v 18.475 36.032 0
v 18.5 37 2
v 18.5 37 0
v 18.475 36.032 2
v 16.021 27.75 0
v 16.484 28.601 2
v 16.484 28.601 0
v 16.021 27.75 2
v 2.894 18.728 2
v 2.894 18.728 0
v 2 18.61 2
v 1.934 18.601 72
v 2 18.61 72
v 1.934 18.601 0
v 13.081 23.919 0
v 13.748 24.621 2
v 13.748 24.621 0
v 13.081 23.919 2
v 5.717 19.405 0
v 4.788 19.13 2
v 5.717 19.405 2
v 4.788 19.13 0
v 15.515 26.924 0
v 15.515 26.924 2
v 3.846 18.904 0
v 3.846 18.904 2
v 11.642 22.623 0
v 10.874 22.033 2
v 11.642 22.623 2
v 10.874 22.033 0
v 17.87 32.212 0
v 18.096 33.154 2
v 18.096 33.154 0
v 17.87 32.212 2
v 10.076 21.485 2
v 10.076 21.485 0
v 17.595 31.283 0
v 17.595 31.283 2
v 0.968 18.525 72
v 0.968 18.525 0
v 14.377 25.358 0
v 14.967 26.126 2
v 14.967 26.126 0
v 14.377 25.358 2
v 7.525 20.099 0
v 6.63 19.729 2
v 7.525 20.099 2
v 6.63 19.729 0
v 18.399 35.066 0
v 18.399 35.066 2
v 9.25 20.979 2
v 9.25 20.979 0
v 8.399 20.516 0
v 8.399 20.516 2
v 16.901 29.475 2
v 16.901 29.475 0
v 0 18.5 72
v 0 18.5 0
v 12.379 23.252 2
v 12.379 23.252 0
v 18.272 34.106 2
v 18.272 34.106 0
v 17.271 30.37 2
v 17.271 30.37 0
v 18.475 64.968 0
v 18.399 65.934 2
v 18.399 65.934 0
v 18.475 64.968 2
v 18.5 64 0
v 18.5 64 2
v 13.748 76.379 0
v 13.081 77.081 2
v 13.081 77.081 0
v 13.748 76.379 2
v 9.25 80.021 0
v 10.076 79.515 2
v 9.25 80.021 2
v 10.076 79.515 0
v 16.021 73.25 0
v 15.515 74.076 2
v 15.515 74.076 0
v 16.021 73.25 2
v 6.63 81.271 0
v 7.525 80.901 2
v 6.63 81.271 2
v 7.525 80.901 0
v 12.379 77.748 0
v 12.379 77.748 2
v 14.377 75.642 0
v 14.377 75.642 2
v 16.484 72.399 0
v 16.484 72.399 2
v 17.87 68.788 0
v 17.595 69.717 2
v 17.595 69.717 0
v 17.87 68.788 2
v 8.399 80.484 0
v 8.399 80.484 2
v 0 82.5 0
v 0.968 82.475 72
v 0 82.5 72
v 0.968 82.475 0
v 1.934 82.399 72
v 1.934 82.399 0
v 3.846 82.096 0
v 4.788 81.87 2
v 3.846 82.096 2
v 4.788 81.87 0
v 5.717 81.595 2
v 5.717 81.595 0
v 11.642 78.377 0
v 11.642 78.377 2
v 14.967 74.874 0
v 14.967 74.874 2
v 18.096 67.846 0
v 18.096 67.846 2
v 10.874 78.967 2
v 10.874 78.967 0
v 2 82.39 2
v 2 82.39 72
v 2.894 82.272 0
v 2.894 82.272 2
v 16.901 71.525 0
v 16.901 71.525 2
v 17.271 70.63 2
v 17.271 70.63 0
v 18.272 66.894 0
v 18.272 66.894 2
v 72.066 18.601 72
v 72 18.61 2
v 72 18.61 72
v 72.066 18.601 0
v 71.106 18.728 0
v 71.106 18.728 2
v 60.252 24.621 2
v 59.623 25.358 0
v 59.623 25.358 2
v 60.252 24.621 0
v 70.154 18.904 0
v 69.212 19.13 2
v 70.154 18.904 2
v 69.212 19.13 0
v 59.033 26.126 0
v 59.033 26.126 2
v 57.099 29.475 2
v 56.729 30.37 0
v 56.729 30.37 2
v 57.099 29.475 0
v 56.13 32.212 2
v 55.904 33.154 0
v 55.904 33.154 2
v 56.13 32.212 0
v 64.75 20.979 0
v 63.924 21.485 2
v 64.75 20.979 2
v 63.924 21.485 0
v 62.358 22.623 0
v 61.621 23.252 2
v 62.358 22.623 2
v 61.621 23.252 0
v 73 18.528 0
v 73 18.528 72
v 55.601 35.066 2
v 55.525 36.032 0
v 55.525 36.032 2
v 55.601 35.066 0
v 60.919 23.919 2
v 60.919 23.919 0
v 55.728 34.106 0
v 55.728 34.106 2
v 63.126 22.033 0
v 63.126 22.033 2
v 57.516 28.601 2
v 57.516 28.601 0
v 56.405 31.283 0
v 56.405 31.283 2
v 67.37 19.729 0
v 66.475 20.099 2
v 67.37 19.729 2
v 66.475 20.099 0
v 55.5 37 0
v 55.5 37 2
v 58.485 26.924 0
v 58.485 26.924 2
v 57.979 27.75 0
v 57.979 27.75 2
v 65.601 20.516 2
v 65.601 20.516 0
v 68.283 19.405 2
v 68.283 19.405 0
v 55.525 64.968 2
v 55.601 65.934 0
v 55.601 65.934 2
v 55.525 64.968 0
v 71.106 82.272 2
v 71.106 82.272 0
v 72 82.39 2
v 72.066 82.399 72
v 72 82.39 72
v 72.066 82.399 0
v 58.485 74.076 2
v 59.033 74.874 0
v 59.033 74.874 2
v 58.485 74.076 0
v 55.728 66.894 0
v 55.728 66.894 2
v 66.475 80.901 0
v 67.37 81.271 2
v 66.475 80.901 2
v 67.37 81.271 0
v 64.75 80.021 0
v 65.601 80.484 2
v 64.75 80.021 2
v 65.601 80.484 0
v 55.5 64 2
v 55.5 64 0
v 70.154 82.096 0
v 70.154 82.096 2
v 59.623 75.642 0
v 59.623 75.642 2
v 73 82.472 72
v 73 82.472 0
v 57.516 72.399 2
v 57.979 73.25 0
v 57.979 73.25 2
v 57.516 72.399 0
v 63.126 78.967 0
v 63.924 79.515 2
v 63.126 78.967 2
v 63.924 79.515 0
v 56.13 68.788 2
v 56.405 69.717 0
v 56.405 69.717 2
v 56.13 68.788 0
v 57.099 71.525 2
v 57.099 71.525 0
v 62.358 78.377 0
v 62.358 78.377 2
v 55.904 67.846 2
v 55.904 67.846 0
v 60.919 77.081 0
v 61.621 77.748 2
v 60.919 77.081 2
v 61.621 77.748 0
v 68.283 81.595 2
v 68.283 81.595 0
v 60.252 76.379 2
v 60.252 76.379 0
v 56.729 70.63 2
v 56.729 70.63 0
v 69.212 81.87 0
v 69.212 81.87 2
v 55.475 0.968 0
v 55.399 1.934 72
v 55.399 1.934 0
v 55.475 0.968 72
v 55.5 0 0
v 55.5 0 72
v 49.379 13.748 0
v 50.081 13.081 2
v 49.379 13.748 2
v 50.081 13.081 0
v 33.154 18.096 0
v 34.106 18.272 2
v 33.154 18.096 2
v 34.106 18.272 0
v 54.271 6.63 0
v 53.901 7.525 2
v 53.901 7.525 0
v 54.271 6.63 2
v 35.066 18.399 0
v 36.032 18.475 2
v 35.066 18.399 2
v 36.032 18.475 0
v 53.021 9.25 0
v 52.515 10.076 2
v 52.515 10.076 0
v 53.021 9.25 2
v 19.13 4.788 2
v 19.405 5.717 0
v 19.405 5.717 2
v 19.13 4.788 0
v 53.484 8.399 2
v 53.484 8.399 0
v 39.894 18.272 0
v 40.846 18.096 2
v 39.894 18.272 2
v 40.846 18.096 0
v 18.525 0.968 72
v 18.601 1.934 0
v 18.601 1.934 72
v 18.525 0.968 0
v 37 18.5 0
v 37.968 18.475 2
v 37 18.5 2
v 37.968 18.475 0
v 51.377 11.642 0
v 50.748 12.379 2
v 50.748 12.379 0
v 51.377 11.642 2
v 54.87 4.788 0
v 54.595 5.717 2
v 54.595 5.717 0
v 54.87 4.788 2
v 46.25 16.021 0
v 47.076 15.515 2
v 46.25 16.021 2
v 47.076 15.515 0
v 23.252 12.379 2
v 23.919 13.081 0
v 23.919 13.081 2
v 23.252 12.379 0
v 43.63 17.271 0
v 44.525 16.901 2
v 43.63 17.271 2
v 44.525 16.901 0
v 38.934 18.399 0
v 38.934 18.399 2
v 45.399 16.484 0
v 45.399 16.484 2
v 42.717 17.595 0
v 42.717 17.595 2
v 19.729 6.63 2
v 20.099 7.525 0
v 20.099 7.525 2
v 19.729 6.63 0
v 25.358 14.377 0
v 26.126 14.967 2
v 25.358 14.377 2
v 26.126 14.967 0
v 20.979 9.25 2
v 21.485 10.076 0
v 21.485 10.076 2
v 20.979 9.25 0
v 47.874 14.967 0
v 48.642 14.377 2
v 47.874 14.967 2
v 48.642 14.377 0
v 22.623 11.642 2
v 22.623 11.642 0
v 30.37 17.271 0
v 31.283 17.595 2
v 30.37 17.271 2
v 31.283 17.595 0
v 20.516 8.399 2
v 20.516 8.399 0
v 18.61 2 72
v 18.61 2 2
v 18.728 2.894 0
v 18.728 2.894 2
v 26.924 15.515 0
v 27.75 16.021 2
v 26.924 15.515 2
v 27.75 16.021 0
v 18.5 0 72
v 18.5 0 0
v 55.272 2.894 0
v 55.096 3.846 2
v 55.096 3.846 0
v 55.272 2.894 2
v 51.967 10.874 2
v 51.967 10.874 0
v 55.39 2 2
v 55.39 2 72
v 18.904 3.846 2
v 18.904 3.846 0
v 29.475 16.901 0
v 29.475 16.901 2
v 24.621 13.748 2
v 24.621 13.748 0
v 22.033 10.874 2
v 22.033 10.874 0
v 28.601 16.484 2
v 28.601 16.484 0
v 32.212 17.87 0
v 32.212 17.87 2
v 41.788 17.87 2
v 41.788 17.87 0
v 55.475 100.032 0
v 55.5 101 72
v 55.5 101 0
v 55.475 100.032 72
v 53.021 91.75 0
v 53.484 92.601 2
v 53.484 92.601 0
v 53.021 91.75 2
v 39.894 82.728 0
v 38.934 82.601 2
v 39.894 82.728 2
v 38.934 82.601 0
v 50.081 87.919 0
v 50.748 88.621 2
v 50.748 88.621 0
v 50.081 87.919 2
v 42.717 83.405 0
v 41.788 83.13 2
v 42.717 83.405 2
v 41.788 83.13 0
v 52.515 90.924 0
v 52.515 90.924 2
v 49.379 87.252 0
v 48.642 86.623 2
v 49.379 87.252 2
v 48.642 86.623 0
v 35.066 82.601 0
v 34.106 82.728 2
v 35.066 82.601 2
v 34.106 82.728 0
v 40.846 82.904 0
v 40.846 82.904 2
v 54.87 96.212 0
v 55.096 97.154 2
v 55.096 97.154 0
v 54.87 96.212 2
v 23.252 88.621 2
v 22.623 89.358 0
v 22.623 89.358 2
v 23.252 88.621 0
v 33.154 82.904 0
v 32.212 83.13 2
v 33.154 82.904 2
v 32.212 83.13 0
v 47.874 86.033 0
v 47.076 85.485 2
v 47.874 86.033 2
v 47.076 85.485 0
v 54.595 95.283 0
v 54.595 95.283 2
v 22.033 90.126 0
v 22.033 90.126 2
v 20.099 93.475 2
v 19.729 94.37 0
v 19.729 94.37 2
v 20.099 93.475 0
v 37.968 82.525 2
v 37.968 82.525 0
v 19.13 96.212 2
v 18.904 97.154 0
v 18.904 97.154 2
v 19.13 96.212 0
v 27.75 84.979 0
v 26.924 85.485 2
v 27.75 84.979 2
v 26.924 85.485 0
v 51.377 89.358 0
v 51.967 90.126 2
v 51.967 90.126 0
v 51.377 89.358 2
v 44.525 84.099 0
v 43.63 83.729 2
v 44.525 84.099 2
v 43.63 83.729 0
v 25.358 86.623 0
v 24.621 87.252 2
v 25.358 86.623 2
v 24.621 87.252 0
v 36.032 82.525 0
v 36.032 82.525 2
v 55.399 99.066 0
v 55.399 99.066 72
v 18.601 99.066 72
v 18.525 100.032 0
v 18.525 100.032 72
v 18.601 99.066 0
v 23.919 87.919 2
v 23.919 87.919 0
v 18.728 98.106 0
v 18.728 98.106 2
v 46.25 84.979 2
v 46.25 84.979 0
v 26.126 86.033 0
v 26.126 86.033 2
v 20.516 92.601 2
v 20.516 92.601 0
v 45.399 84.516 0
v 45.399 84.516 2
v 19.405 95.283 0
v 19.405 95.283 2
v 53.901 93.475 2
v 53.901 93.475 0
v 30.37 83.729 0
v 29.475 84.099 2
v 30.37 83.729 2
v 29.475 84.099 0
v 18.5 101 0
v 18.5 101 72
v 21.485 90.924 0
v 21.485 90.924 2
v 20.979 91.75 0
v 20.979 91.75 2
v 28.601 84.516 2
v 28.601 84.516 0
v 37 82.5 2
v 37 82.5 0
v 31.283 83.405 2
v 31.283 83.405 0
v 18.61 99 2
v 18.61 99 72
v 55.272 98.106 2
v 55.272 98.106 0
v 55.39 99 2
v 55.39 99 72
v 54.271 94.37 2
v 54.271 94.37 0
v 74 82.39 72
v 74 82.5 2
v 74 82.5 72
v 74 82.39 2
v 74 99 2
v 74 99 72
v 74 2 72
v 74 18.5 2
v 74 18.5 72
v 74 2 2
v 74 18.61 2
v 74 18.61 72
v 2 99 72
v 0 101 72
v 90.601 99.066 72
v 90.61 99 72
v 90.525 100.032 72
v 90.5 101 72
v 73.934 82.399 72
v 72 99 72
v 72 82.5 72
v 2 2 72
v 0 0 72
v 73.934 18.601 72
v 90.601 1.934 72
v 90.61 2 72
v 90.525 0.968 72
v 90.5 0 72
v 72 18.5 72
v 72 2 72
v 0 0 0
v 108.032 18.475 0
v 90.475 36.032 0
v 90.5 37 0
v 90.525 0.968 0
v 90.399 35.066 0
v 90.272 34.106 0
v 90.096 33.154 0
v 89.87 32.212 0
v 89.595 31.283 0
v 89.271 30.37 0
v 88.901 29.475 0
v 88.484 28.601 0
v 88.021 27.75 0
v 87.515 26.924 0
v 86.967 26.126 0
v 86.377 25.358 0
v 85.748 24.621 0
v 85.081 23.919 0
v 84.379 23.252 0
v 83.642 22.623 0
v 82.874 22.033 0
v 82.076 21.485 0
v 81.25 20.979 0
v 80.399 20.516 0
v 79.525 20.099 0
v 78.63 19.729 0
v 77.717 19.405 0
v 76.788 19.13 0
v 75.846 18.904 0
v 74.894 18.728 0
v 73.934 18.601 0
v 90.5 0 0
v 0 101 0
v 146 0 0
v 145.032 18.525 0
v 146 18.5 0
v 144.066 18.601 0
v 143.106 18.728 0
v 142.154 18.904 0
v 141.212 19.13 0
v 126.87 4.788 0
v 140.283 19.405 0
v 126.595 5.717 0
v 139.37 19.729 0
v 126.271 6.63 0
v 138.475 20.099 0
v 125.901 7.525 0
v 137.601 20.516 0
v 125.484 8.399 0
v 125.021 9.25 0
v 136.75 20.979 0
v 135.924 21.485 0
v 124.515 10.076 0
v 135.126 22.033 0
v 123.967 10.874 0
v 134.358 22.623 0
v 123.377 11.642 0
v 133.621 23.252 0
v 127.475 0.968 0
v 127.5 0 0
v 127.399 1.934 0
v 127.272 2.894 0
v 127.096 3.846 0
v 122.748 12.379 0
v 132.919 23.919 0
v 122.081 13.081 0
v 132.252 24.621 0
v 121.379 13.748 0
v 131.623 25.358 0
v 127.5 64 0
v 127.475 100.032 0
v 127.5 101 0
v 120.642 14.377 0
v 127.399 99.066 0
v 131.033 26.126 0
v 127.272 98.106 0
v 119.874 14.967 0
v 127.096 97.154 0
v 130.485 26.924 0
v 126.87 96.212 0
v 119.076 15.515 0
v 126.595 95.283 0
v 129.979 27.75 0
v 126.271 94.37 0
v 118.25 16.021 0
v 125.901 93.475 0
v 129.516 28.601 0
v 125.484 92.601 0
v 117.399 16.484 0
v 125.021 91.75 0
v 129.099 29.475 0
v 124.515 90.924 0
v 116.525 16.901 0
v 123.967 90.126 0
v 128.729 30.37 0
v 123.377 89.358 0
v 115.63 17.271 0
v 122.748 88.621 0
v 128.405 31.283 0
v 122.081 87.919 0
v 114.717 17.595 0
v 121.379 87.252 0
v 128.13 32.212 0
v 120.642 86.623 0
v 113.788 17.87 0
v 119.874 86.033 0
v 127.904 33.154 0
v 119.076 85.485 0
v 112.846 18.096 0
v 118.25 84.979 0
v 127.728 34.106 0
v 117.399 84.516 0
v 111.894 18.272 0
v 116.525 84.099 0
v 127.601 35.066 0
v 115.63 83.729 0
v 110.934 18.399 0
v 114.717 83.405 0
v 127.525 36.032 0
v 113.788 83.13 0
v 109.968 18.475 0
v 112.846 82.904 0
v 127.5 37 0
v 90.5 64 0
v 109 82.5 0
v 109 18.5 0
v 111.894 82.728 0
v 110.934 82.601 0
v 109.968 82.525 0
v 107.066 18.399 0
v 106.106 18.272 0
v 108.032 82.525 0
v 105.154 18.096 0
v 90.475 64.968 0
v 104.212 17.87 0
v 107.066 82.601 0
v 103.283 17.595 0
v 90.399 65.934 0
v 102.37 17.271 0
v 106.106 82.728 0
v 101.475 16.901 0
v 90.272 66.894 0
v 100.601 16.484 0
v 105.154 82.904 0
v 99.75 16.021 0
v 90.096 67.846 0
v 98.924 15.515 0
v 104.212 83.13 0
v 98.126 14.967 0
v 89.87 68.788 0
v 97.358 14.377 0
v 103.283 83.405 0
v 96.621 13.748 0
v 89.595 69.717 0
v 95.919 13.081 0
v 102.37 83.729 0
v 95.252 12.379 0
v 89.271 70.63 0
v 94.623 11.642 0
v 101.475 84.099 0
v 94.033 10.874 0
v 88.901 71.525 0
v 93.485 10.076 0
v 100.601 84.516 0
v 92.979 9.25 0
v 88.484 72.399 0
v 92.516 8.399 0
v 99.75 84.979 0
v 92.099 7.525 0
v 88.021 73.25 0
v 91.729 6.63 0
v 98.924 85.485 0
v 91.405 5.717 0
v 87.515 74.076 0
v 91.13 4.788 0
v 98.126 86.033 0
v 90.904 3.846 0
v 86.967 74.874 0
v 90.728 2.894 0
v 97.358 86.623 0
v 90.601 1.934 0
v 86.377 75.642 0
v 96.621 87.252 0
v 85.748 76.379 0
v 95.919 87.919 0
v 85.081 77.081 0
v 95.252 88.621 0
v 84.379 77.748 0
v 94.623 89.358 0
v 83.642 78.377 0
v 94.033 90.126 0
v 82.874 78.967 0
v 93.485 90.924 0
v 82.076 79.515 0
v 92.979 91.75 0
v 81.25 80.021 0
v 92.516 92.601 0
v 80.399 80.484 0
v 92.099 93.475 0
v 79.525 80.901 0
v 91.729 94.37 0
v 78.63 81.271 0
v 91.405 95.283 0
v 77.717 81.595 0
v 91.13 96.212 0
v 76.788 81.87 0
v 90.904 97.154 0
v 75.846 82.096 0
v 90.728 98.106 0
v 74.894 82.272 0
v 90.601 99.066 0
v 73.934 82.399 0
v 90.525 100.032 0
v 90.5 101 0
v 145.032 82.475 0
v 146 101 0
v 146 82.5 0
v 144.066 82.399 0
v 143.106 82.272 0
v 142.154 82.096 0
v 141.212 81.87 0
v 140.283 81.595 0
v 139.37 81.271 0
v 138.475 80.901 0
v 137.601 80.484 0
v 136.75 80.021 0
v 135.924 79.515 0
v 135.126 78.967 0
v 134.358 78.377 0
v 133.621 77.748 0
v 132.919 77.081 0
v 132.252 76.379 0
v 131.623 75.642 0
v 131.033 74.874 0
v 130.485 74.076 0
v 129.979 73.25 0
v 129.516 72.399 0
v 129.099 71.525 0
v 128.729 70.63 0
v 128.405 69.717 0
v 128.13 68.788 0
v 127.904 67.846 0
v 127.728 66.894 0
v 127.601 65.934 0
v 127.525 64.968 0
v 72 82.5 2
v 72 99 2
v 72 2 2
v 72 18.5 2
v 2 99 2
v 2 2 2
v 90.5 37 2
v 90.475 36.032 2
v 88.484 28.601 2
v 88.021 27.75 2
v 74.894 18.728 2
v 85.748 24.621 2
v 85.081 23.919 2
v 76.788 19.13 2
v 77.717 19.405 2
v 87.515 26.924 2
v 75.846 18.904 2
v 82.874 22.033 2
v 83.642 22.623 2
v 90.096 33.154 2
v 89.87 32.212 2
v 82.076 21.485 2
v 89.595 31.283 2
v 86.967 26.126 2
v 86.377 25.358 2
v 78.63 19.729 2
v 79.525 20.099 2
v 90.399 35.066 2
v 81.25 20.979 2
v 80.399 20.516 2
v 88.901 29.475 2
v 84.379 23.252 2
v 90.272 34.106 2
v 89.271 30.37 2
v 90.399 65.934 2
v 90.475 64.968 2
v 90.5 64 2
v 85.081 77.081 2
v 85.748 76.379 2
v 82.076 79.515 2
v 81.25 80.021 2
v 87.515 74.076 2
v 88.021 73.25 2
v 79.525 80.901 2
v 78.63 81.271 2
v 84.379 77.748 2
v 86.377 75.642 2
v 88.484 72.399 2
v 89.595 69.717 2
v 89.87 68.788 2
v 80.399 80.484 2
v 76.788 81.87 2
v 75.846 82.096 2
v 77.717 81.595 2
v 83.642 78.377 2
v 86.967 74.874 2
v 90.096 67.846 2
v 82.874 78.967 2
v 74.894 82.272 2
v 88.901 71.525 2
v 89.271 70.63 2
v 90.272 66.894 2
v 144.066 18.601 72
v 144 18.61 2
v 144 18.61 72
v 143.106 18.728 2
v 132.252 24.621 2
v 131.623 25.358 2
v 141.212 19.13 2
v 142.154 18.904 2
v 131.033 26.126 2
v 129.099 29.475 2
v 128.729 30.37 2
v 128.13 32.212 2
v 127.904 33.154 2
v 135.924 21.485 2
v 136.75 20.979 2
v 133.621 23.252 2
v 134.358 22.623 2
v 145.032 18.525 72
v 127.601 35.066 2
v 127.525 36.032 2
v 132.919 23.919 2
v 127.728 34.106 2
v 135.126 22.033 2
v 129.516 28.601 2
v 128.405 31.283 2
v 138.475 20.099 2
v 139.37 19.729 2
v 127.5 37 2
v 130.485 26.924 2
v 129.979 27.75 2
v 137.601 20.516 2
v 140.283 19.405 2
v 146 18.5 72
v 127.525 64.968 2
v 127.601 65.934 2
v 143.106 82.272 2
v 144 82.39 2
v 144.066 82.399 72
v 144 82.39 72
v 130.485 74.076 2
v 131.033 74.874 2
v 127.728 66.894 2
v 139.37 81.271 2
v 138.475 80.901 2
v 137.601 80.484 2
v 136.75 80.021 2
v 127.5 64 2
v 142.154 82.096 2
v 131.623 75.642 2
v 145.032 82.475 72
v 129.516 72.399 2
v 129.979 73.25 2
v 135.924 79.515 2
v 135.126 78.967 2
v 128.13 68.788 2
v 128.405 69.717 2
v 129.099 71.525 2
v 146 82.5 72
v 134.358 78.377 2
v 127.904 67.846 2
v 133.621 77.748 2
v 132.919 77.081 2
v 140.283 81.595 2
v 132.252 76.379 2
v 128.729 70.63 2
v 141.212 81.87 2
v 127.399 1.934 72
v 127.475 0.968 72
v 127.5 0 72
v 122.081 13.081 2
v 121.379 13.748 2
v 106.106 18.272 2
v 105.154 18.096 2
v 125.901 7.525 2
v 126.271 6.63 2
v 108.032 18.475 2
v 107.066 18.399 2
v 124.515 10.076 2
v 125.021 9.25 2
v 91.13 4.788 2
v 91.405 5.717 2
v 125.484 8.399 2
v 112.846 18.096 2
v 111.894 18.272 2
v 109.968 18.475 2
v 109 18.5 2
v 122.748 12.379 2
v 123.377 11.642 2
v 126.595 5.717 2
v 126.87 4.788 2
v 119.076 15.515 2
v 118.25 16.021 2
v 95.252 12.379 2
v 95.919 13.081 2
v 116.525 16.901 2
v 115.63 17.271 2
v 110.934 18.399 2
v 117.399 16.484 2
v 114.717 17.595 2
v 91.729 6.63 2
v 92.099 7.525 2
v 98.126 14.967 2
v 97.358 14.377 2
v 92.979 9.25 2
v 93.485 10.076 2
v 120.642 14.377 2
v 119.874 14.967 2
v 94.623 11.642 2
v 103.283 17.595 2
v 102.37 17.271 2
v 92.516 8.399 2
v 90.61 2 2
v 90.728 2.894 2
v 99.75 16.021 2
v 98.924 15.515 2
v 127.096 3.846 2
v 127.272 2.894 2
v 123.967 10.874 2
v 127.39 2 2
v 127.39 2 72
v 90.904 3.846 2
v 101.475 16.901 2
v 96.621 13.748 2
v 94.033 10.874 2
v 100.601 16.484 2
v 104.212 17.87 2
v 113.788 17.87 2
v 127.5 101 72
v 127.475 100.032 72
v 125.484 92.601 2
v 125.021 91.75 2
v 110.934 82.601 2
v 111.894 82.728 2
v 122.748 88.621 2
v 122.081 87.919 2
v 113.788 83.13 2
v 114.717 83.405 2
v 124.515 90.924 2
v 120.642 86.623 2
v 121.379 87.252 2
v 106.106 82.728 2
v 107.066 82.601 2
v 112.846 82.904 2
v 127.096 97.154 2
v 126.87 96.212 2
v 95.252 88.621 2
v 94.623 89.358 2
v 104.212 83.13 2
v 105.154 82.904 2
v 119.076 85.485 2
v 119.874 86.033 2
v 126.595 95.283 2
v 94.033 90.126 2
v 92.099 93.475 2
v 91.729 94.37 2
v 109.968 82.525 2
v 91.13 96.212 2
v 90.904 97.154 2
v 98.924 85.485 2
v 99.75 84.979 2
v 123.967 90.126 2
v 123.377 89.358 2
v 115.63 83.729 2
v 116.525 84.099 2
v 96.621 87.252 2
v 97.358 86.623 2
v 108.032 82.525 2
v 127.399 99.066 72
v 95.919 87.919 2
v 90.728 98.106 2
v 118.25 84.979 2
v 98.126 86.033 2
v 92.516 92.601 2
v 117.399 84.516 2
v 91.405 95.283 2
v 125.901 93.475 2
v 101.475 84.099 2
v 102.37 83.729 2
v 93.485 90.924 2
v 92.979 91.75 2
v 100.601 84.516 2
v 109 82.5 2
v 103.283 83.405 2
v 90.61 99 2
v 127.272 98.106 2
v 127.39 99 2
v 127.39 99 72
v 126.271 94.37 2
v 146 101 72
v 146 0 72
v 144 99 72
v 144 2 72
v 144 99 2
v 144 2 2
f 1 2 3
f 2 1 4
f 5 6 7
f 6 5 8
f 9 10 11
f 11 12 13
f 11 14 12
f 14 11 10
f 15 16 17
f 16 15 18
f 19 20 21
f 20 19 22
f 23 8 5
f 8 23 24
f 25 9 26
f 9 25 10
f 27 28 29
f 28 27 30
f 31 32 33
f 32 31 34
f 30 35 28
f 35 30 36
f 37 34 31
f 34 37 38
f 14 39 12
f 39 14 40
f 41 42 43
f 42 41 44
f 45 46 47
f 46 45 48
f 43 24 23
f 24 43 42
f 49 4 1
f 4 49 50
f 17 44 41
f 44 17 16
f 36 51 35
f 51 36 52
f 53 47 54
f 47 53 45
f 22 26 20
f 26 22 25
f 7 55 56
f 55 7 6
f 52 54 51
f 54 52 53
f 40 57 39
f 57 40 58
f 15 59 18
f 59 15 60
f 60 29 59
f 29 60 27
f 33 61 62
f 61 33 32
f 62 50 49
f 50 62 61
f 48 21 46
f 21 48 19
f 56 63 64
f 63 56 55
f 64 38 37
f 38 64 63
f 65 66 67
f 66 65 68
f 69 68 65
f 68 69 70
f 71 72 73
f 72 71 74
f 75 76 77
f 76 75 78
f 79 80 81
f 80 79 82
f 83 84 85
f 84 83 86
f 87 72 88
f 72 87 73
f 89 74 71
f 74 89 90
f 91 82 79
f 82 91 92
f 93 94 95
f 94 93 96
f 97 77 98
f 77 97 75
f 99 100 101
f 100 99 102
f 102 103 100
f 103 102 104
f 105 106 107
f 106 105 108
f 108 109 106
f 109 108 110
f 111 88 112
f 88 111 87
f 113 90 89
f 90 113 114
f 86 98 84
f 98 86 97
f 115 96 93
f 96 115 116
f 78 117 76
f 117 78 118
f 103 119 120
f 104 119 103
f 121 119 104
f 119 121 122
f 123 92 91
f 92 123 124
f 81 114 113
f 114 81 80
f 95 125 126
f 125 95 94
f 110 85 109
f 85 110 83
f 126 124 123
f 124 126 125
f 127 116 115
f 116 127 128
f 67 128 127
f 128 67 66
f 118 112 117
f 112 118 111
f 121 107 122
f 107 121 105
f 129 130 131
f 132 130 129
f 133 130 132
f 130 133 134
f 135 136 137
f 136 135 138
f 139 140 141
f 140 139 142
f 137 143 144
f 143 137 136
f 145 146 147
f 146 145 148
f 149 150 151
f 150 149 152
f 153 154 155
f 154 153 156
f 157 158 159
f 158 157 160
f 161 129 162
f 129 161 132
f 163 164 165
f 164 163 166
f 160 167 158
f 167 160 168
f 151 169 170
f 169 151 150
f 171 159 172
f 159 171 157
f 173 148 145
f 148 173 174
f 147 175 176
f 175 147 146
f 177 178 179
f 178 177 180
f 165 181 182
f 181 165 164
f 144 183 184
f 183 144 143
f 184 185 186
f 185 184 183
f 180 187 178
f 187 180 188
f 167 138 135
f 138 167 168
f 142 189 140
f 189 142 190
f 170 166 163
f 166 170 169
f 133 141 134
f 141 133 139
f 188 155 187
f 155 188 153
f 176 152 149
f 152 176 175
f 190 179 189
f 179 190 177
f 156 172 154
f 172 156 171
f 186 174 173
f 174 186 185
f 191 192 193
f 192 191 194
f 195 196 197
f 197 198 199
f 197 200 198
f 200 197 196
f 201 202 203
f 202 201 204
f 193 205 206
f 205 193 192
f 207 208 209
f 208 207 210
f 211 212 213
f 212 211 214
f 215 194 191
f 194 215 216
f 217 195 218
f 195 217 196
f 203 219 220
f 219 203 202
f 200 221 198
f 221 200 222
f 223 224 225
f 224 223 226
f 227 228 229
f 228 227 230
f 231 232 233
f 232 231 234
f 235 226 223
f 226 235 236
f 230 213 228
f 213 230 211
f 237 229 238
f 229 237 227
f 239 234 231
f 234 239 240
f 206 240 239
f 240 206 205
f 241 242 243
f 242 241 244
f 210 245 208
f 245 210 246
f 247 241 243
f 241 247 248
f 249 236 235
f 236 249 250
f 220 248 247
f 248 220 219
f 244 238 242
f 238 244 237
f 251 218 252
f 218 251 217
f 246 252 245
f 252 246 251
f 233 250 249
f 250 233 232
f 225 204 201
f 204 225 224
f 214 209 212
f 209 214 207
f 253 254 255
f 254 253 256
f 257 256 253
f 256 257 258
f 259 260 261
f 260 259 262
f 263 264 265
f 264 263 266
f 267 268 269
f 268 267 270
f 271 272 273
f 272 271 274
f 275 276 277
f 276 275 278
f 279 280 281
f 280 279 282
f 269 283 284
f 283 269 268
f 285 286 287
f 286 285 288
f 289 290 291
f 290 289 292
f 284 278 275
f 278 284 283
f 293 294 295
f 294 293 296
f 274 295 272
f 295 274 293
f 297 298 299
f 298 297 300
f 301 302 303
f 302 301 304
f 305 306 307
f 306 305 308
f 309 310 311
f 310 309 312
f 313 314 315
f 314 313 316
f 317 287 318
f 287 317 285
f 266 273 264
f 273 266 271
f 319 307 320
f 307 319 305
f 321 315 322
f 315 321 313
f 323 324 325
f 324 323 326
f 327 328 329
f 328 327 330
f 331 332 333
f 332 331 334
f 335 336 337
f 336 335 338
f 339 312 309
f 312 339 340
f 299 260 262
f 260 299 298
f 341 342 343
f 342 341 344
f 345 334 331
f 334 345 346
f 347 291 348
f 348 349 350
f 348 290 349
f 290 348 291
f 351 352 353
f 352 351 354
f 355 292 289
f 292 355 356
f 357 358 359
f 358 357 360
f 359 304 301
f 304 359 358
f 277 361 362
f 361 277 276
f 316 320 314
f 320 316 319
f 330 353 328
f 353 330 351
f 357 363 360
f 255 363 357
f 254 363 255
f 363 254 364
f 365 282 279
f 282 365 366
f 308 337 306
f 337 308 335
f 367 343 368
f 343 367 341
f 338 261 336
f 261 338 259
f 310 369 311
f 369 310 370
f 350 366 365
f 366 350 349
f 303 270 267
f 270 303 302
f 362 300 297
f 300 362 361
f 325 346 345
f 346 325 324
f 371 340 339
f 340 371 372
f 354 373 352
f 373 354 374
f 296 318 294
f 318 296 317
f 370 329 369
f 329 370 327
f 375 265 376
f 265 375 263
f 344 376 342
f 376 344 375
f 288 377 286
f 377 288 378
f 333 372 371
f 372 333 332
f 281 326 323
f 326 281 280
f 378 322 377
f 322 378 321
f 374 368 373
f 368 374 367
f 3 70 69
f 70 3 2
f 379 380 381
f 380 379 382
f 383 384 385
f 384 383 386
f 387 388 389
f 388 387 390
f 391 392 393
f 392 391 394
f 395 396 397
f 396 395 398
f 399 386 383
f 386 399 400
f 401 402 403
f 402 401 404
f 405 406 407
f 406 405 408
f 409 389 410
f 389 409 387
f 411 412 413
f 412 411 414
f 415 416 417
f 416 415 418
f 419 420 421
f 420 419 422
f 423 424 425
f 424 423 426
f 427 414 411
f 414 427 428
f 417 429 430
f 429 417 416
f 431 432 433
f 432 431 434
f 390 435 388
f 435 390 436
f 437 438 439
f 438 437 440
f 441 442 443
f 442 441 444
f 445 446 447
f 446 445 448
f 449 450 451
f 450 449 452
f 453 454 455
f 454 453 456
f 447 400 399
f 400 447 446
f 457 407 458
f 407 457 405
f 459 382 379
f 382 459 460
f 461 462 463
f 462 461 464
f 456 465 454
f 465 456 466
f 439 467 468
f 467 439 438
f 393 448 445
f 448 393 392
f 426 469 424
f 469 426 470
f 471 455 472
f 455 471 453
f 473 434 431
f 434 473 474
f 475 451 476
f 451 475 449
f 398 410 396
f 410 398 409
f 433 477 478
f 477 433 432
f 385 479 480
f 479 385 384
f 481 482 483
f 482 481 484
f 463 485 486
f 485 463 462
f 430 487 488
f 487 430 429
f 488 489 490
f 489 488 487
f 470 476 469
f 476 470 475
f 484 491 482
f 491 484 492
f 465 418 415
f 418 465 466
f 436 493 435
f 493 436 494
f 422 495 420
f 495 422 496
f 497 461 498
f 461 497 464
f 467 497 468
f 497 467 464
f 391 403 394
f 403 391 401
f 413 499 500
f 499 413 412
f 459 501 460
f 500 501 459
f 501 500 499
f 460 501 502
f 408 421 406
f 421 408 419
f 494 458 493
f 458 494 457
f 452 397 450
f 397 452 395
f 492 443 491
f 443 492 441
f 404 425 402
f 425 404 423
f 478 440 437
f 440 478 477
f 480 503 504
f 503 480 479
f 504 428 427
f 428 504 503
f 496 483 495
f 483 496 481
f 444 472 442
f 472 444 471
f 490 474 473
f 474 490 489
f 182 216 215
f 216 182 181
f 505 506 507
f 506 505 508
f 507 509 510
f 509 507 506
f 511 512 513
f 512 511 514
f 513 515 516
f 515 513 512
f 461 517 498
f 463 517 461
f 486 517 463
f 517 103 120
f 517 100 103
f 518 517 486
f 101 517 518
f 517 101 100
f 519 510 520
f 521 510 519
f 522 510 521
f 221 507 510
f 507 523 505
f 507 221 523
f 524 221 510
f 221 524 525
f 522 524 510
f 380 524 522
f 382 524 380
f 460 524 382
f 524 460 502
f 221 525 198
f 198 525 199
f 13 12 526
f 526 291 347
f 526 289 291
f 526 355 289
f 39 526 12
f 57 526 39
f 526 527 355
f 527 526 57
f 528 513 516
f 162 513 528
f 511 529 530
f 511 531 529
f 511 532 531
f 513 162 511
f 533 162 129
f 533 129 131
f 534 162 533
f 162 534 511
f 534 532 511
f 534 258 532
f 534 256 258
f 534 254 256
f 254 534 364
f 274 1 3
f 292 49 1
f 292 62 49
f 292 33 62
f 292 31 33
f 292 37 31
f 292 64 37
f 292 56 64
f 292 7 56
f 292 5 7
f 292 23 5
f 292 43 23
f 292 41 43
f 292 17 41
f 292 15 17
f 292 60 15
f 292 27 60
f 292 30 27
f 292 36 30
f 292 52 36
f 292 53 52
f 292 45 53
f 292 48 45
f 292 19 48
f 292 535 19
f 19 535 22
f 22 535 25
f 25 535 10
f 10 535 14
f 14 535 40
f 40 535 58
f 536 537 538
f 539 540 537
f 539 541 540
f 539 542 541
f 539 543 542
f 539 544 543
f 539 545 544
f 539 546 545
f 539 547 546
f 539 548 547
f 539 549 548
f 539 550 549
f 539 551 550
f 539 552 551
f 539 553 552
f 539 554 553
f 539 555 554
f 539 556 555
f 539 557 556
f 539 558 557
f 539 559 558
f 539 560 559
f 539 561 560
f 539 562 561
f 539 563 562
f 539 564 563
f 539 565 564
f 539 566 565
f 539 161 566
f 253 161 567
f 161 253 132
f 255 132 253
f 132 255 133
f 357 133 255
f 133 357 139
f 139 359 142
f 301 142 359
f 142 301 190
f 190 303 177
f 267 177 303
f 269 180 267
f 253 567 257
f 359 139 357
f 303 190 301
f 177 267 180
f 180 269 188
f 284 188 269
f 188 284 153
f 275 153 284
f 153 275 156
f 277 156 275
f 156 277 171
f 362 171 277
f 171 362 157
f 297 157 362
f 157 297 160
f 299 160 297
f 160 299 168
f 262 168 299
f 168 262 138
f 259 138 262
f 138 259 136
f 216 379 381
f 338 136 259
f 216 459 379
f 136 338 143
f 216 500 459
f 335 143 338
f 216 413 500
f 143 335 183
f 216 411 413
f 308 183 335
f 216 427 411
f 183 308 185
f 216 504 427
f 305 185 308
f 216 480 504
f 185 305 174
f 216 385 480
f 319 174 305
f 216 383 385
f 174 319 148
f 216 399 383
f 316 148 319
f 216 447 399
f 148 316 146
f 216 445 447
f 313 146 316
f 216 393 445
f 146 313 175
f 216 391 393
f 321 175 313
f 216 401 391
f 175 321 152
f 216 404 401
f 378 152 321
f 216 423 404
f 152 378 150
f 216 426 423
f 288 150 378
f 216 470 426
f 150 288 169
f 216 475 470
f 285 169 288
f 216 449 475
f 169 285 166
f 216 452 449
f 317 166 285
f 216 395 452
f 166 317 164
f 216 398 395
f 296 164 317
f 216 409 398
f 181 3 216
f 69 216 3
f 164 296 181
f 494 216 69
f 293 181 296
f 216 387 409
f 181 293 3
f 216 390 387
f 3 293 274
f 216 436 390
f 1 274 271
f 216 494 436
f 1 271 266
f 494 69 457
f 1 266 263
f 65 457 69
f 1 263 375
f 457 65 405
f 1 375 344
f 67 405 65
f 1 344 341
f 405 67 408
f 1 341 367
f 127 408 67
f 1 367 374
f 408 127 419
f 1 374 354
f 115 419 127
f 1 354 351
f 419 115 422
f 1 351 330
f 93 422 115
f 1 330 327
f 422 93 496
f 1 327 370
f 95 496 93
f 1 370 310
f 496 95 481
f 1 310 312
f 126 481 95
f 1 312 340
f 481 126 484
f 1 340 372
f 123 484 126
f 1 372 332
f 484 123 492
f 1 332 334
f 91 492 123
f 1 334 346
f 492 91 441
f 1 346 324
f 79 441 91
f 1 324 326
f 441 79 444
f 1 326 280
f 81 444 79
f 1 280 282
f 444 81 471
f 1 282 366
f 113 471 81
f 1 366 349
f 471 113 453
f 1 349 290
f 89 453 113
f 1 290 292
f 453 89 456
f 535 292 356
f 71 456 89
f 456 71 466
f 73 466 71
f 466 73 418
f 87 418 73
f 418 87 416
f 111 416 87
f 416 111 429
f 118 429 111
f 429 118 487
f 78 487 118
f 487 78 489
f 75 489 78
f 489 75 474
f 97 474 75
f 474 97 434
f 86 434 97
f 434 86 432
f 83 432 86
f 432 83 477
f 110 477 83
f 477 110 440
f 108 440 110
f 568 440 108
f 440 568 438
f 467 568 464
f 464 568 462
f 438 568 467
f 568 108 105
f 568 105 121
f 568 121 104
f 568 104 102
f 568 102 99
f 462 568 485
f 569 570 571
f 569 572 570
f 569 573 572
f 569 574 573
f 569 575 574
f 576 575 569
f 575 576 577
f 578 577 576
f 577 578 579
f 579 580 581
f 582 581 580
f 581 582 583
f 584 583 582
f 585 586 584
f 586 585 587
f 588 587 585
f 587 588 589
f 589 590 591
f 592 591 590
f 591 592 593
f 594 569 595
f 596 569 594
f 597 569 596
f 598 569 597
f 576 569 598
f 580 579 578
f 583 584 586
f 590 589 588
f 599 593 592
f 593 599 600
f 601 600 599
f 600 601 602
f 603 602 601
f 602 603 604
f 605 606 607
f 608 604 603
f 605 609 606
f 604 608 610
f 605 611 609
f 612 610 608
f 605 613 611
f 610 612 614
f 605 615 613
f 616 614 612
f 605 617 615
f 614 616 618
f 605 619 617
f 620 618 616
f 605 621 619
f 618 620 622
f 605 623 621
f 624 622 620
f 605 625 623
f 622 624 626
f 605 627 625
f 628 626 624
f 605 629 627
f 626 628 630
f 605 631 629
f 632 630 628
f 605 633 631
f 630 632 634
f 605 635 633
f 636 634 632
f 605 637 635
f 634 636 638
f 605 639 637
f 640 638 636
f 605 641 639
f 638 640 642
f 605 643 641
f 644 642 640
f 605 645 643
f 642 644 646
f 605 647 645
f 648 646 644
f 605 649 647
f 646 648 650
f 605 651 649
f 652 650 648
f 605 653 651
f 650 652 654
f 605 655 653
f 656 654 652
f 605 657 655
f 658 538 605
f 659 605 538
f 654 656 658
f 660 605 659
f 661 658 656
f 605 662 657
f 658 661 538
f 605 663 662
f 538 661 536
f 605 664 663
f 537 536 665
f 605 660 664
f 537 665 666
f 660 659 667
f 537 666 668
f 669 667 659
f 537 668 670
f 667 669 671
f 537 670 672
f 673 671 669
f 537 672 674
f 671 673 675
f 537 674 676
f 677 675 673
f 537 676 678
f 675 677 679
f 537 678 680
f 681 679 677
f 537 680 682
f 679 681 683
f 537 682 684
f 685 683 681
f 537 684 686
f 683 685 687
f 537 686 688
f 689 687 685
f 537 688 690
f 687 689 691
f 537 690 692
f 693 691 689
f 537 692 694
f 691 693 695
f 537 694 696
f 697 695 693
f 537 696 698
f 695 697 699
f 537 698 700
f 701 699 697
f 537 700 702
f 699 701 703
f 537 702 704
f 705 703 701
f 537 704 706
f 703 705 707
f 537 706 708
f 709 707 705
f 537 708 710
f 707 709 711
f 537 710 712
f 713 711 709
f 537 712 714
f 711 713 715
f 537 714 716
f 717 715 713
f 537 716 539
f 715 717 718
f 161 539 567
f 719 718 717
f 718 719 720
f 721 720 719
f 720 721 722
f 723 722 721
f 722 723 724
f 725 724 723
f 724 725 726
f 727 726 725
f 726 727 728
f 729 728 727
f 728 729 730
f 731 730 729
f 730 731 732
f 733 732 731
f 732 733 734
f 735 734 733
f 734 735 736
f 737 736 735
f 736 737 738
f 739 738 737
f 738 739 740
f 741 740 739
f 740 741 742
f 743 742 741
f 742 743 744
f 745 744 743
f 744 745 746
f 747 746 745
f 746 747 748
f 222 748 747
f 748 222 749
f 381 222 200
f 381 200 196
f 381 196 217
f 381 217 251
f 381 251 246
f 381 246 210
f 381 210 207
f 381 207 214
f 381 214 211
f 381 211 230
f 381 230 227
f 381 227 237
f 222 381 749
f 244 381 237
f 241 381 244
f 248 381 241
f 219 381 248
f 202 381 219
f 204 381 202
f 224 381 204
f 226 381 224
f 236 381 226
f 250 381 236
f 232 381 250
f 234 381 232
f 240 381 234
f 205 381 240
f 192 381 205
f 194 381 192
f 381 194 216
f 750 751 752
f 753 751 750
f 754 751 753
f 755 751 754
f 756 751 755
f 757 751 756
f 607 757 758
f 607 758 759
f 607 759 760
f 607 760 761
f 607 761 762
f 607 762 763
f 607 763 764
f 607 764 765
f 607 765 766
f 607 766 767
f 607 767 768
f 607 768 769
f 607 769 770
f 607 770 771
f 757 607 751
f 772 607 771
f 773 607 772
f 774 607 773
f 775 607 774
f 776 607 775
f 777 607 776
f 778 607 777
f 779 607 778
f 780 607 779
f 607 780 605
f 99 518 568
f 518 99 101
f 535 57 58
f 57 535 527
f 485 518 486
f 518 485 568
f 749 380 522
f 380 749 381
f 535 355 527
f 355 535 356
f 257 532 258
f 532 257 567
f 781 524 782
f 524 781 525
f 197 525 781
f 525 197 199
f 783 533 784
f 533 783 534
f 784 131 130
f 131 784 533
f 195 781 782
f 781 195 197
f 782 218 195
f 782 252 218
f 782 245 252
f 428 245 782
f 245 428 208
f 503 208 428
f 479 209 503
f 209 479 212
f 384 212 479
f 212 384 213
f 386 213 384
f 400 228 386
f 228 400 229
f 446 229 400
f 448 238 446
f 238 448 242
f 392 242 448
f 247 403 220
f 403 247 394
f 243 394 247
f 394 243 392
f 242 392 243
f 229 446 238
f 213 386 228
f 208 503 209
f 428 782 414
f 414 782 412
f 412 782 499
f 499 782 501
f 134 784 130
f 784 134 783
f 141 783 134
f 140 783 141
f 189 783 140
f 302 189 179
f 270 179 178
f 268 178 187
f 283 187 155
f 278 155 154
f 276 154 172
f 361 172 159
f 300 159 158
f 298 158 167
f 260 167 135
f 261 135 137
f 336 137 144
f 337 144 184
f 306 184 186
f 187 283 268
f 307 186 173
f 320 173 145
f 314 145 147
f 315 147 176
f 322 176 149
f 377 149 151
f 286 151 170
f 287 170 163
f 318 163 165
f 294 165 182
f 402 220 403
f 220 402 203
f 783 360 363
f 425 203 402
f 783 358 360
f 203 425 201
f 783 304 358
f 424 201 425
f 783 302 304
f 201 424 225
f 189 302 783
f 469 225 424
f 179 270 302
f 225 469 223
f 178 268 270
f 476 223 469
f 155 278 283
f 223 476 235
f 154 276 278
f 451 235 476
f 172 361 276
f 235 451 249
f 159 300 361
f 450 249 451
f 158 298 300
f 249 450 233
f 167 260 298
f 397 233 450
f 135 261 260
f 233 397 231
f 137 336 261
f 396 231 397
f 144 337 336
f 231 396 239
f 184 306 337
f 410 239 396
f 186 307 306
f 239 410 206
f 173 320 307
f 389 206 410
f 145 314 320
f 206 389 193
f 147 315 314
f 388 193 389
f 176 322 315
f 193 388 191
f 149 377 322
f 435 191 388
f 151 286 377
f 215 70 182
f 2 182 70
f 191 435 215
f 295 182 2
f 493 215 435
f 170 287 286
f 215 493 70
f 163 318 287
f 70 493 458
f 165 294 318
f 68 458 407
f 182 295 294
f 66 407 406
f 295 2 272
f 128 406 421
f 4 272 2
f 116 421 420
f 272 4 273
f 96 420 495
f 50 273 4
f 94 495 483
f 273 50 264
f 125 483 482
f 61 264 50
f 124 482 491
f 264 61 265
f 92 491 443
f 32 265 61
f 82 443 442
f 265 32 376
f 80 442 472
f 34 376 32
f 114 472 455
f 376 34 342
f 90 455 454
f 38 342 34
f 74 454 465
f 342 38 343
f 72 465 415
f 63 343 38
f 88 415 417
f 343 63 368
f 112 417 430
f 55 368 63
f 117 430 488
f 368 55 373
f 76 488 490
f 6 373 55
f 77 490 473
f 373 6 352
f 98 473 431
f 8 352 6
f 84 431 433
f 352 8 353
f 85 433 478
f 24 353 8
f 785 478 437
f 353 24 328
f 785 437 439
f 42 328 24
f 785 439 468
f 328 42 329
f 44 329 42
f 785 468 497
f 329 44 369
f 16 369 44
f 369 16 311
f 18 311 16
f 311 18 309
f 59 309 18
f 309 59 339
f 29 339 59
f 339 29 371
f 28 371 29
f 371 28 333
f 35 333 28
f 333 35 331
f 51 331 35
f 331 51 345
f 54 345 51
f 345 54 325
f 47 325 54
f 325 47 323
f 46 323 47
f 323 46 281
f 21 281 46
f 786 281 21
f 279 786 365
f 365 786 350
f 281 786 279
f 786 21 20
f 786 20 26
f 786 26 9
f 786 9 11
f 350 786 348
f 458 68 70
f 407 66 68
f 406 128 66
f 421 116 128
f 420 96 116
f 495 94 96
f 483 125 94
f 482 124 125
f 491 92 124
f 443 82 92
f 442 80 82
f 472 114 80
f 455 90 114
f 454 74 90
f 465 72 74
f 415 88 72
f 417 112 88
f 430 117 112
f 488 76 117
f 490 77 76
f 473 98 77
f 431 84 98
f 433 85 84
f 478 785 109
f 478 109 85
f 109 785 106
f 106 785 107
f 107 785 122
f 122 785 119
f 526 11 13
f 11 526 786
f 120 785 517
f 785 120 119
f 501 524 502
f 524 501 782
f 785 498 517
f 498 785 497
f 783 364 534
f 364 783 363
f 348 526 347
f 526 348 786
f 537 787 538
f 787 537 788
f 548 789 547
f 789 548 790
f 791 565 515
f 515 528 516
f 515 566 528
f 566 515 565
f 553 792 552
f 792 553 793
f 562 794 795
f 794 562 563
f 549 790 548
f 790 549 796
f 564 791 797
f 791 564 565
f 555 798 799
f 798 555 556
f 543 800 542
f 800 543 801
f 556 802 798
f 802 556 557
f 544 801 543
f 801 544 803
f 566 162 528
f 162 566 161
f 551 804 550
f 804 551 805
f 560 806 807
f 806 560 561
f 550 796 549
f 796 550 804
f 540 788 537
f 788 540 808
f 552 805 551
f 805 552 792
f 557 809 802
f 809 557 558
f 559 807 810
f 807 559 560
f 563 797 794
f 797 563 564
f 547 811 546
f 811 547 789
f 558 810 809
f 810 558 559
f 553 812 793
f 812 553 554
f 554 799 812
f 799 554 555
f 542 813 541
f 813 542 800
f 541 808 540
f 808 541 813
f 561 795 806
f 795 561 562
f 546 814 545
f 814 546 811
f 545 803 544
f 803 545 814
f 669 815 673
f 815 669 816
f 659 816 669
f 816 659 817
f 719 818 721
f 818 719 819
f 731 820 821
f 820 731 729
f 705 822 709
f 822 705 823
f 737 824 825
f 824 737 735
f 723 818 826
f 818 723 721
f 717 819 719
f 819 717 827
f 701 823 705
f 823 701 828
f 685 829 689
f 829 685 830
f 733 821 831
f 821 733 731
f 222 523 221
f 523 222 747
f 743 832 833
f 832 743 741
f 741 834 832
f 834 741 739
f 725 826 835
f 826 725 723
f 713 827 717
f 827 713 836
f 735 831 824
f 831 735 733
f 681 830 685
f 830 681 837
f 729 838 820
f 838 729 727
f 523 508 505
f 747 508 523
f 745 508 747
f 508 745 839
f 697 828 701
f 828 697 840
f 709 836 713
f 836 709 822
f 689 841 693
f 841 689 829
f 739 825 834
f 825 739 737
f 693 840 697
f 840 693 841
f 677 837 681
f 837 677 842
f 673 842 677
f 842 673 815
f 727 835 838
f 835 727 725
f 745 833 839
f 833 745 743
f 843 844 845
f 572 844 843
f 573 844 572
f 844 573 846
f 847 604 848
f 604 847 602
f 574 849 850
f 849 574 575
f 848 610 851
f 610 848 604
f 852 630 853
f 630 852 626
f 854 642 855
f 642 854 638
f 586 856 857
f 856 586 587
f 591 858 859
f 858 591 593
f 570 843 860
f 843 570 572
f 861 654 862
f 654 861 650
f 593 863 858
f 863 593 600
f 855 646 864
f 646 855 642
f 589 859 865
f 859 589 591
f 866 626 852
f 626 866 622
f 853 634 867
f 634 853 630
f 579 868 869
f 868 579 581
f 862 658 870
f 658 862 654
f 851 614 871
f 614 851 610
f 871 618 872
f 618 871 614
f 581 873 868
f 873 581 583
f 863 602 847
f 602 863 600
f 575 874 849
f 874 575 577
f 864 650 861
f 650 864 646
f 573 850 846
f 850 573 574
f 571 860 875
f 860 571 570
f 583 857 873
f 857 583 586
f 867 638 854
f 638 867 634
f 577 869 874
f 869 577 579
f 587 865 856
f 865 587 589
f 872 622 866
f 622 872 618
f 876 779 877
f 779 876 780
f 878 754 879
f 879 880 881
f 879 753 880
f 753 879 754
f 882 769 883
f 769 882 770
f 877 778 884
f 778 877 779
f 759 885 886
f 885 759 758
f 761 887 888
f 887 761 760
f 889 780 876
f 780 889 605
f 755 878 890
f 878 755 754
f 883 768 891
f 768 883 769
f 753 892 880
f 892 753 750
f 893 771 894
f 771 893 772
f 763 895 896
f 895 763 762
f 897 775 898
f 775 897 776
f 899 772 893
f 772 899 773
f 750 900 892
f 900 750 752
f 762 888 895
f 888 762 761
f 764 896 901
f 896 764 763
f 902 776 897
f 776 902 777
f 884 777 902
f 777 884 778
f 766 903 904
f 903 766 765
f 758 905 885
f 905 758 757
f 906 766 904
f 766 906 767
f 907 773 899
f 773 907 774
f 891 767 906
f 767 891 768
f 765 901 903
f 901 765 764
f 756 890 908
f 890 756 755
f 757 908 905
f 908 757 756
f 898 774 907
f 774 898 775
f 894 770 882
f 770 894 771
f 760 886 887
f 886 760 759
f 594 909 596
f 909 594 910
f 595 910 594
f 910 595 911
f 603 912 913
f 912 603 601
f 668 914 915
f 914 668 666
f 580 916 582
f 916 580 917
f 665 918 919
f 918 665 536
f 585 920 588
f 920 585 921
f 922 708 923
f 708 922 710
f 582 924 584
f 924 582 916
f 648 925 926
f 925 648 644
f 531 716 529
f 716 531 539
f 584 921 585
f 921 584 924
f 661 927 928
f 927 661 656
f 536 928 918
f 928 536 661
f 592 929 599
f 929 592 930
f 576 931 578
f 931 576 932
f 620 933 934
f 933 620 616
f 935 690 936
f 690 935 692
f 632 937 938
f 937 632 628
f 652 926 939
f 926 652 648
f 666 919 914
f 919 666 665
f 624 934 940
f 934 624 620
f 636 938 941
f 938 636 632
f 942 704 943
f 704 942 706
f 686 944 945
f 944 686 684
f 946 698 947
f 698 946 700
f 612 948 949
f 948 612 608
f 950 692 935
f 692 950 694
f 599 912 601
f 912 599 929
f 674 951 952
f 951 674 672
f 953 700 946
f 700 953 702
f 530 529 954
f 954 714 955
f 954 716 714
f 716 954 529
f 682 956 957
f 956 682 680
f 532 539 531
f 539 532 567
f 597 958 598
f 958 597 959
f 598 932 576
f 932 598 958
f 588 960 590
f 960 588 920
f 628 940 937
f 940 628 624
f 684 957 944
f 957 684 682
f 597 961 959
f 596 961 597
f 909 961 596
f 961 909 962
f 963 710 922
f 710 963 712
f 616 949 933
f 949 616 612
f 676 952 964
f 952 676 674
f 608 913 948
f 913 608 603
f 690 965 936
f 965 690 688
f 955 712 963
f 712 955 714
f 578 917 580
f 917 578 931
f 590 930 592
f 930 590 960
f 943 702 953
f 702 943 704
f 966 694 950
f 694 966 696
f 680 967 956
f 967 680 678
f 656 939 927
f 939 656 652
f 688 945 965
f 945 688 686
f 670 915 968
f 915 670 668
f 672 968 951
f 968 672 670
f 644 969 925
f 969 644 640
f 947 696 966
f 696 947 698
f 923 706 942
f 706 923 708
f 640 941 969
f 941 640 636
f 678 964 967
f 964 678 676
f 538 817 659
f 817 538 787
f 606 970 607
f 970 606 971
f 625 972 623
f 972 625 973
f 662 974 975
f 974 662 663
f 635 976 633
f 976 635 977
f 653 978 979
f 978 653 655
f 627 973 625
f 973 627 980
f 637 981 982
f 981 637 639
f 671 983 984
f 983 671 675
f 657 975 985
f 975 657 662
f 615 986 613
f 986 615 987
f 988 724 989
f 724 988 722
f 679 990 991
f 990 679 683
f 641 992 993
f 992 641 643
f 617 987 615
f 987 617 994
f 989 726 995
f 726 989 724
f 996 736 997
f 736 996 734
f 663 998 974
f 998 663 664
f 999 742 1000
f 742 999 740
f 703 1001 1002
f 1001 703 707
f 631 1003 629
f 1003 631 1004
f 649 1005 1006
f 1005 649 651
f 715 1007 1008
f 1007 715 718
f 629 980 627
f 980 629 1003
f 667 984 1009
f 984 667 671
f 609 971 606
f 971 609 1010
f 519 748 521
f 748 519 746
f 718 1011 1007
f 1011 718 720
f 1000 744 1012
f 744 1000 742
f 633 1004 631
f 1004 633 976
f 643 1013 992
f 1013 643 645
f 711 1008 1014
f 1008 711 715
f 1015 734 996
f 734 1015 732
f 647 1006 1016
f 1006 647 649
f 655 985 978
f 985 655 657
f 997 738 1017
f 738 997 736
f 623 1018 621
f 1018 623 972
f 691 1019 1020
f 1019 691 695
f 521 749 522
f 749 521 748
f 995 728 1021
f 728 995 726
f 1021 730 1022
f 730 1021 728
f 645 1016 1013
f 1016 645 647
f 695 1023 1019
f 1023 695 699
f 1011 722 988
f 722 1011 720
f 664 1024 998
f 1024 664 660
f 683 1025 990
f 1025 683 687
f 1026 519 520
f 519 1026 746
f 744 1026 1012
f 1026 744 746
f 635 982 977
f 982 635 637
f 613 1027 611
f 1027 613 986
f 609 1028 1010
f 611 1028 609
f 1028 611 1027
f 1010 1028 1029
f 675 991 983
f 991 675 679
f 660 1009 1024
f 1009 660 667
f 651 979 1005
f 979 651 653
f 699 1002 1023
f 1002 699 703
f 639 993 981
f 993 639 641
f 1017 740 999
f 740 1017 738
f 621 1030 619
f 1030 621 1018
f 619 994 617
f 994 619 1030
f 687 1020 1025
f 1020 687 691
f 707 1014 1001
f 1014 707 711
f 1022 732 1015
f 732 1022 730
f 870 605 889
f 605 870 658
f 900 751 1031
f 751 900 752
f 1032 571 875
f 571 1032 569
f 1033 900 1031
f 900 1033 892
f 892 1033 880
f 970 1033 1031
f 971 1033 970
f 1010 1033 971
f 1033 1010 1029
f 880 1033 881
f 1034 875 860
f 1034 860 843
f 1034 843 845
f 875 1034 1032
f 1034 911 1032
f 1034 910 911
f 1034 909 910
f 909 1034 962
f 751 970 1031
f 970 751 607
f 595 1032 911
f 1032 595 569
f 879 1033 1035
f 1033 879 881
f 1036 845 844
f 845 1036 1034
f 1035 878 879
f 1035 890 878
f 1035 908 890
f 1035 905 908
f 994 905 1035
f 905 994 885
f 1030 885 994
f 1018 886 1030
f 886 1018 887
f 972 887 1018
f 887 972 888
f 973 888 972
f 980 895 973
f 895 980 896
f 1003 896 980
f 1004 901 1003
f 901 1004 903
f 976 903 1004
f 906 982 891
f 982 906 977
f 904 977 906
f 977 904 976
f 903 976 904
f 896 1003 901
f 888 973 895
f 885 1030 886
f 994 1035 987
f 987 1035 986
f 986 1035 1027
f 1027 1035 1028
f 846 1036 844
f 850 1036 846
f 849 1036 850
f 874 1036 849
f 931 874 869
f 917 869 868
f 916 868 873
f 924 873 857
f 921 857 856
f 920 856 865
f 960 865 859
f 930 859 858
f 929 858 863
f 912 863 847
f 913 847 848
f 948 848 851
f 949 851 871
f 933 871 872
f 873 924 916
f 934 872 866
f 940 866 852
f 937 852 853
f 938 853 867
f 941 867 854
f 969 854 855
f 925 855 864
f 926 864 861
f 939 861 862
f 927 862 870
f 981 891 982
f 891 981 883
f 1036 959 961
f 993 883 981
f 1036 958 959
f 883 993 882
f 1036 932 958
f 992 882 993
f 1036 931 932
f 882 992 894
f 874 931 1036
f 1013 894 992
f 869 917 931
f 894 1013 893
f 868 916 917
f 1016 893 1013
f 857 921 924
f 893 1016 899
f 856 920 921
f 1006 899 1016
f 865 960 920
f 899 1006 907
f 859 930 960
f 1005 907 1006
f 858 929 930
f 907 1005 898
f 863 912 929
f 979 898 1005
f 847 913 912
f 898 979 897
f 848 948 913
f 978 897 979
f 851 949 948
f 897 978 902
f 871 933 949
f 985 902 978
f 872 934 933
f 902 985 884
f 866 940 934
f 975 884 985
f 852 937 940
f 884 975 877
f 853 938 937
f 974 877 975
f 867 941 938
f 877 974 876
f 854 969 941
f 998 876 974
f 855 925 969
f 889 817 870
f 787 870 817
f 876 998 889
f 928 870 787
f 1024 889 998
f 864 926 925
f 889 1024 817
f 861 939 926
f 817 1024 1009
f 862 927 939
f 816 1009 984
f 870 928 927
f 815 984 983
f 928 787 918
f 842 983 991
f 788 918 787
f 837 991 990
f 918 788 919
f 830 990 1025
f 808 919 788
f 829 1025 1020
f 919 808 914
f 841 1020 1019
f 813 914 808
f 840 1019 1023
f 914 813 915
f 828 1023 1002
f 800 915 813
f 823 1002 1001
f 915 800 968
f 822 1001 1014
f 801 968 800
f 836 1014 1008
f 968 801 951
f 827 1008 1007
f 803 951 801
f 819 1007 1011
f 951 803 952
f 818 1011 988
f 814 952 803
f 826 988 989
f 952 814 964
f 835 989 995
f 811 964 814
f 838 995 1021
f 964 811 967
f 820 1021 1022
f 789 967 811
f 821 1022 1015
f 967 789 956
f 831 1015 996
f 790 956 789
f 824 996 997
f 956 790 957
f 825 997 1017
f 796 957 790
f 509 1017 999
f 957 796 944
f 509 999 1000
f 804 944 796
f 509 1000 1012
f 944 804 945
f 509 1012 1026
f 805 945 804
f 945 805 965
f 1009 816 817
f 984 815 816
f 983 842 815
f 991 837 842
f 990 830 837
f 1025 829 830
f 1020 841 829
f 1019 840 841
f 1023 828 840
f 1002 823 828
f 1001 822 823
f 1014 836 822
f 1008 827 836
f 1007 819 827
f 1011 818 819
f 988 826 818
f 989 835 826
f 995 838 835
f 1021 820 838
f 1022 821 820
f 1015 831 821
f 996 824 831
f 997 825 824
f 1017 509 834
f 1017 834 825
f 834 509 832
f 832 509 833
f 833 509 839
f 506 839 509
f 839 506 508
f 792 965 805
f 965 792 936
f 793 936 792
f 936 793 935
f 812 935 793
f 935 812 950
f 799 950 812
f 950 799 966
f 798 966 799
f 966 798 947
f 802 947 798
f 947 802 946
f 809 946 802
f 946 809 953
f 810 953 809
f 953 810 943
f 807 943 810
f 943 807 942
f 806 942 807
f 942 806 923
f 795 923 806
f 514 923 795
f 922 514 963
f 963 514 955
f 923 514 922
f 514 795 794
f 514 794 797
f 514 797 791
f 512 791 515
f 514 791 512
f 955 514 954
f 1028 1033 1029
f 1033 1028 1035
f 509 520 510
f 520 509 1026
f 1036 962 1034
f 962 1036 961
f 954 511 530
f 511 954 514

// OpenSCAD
//
// Parametric card tray for board games
//
// Copyright 2015 Magnus Kvevlander <magu@me.com>
//
// Creative Commons Attribution-NonCommercial 3.0 Unported (CC BY-NC 3.0)
// http://creativecommons.org/licenses/by-nc/3.0/
//

// The width of the card stack cutout
w = 70;

// The height of the card stack cutout
h = 97;

// The depth of the card stack cutout
d = 70;

// The number of rows
rows = 1; // [1:10]

// The number of columns
cols = 2; // [1:10]

// Material thickness
thk = 2;

/* [Hidden] */

$fa = 3;
$fs = 0.5;

// draw code with sanity check if wider than tall, not to bork draw code
if ( w <= h )
    card_tray(x = w, y = h, z = d, thk = thk, rows = rows, cols = cols);
else
    rotate ([0, 0, 90]) mirror ([0, 1, 0])
        card_tray(x = h, y = w, z = d, thk = thk, rows = cols, cols = rows);

// Arcane Tinmen Small (red) 46 x 72
// Arcane Tinmen Standard (grey) 67 x 94
// Arcane Tinmen Medium (green) 59 x 93
// Arcane Tinmen Large (blue) 63 x 97
// FFG Square (Power Grid) 73 x 73
// FFG Yellow (Eldritch horror) 44 x 67.3
// Mayday War of the Ring 71 x 122

module card_tray (x = 50, y = 100, z = 50, thk = 2, rows = 1, cols = 2)
union ()
    for (i = [0:cols-1]) for (j = [0:rows-1])
        translate ([i * (x + thk), j * (y + thk), 0])
            card_holder (x, y, z, thk);

module card_holder (x, y, z, thk)
difference () {
    // body
	cube ([x + 2 * thk, y + 2 * thk, z + thk]);
    // card stack cutout
	translate ([thk, thk, thk])
		cube ([x, y, z + thk]);
    // slot cutouts
	for (i = [0, 1]) {
        // mid x cutouts
		translate ([(2 * thk + x) / 2, i * (2 * thk + y), -thk])
			cylinder ( r = (x + 2 * thk)/4, h = z + 3 * thk );
        // mid y cutouts' edges
		for ( j = [-1, 1] )
			translate ([i * (2 * thk + x), (2 * thk + y) / 2 + j * ((2 * thk + y)-(x + 2 * thk))/2, - thk])
				cylinder ( r = (x + 2 * thk)/4, h = z + 3 * thk );
        // mid y cutouts' center
		translate ([i * (2 * thk + x), (2 * thk + y) / 2, (z + 3 * thk)/2 - thk])
			cube ([2 * (x + 2 * thk)/4, ((2 * thk + y)-(x + 2 * thk)), z + 3 * thk], center = true);
	}
}
